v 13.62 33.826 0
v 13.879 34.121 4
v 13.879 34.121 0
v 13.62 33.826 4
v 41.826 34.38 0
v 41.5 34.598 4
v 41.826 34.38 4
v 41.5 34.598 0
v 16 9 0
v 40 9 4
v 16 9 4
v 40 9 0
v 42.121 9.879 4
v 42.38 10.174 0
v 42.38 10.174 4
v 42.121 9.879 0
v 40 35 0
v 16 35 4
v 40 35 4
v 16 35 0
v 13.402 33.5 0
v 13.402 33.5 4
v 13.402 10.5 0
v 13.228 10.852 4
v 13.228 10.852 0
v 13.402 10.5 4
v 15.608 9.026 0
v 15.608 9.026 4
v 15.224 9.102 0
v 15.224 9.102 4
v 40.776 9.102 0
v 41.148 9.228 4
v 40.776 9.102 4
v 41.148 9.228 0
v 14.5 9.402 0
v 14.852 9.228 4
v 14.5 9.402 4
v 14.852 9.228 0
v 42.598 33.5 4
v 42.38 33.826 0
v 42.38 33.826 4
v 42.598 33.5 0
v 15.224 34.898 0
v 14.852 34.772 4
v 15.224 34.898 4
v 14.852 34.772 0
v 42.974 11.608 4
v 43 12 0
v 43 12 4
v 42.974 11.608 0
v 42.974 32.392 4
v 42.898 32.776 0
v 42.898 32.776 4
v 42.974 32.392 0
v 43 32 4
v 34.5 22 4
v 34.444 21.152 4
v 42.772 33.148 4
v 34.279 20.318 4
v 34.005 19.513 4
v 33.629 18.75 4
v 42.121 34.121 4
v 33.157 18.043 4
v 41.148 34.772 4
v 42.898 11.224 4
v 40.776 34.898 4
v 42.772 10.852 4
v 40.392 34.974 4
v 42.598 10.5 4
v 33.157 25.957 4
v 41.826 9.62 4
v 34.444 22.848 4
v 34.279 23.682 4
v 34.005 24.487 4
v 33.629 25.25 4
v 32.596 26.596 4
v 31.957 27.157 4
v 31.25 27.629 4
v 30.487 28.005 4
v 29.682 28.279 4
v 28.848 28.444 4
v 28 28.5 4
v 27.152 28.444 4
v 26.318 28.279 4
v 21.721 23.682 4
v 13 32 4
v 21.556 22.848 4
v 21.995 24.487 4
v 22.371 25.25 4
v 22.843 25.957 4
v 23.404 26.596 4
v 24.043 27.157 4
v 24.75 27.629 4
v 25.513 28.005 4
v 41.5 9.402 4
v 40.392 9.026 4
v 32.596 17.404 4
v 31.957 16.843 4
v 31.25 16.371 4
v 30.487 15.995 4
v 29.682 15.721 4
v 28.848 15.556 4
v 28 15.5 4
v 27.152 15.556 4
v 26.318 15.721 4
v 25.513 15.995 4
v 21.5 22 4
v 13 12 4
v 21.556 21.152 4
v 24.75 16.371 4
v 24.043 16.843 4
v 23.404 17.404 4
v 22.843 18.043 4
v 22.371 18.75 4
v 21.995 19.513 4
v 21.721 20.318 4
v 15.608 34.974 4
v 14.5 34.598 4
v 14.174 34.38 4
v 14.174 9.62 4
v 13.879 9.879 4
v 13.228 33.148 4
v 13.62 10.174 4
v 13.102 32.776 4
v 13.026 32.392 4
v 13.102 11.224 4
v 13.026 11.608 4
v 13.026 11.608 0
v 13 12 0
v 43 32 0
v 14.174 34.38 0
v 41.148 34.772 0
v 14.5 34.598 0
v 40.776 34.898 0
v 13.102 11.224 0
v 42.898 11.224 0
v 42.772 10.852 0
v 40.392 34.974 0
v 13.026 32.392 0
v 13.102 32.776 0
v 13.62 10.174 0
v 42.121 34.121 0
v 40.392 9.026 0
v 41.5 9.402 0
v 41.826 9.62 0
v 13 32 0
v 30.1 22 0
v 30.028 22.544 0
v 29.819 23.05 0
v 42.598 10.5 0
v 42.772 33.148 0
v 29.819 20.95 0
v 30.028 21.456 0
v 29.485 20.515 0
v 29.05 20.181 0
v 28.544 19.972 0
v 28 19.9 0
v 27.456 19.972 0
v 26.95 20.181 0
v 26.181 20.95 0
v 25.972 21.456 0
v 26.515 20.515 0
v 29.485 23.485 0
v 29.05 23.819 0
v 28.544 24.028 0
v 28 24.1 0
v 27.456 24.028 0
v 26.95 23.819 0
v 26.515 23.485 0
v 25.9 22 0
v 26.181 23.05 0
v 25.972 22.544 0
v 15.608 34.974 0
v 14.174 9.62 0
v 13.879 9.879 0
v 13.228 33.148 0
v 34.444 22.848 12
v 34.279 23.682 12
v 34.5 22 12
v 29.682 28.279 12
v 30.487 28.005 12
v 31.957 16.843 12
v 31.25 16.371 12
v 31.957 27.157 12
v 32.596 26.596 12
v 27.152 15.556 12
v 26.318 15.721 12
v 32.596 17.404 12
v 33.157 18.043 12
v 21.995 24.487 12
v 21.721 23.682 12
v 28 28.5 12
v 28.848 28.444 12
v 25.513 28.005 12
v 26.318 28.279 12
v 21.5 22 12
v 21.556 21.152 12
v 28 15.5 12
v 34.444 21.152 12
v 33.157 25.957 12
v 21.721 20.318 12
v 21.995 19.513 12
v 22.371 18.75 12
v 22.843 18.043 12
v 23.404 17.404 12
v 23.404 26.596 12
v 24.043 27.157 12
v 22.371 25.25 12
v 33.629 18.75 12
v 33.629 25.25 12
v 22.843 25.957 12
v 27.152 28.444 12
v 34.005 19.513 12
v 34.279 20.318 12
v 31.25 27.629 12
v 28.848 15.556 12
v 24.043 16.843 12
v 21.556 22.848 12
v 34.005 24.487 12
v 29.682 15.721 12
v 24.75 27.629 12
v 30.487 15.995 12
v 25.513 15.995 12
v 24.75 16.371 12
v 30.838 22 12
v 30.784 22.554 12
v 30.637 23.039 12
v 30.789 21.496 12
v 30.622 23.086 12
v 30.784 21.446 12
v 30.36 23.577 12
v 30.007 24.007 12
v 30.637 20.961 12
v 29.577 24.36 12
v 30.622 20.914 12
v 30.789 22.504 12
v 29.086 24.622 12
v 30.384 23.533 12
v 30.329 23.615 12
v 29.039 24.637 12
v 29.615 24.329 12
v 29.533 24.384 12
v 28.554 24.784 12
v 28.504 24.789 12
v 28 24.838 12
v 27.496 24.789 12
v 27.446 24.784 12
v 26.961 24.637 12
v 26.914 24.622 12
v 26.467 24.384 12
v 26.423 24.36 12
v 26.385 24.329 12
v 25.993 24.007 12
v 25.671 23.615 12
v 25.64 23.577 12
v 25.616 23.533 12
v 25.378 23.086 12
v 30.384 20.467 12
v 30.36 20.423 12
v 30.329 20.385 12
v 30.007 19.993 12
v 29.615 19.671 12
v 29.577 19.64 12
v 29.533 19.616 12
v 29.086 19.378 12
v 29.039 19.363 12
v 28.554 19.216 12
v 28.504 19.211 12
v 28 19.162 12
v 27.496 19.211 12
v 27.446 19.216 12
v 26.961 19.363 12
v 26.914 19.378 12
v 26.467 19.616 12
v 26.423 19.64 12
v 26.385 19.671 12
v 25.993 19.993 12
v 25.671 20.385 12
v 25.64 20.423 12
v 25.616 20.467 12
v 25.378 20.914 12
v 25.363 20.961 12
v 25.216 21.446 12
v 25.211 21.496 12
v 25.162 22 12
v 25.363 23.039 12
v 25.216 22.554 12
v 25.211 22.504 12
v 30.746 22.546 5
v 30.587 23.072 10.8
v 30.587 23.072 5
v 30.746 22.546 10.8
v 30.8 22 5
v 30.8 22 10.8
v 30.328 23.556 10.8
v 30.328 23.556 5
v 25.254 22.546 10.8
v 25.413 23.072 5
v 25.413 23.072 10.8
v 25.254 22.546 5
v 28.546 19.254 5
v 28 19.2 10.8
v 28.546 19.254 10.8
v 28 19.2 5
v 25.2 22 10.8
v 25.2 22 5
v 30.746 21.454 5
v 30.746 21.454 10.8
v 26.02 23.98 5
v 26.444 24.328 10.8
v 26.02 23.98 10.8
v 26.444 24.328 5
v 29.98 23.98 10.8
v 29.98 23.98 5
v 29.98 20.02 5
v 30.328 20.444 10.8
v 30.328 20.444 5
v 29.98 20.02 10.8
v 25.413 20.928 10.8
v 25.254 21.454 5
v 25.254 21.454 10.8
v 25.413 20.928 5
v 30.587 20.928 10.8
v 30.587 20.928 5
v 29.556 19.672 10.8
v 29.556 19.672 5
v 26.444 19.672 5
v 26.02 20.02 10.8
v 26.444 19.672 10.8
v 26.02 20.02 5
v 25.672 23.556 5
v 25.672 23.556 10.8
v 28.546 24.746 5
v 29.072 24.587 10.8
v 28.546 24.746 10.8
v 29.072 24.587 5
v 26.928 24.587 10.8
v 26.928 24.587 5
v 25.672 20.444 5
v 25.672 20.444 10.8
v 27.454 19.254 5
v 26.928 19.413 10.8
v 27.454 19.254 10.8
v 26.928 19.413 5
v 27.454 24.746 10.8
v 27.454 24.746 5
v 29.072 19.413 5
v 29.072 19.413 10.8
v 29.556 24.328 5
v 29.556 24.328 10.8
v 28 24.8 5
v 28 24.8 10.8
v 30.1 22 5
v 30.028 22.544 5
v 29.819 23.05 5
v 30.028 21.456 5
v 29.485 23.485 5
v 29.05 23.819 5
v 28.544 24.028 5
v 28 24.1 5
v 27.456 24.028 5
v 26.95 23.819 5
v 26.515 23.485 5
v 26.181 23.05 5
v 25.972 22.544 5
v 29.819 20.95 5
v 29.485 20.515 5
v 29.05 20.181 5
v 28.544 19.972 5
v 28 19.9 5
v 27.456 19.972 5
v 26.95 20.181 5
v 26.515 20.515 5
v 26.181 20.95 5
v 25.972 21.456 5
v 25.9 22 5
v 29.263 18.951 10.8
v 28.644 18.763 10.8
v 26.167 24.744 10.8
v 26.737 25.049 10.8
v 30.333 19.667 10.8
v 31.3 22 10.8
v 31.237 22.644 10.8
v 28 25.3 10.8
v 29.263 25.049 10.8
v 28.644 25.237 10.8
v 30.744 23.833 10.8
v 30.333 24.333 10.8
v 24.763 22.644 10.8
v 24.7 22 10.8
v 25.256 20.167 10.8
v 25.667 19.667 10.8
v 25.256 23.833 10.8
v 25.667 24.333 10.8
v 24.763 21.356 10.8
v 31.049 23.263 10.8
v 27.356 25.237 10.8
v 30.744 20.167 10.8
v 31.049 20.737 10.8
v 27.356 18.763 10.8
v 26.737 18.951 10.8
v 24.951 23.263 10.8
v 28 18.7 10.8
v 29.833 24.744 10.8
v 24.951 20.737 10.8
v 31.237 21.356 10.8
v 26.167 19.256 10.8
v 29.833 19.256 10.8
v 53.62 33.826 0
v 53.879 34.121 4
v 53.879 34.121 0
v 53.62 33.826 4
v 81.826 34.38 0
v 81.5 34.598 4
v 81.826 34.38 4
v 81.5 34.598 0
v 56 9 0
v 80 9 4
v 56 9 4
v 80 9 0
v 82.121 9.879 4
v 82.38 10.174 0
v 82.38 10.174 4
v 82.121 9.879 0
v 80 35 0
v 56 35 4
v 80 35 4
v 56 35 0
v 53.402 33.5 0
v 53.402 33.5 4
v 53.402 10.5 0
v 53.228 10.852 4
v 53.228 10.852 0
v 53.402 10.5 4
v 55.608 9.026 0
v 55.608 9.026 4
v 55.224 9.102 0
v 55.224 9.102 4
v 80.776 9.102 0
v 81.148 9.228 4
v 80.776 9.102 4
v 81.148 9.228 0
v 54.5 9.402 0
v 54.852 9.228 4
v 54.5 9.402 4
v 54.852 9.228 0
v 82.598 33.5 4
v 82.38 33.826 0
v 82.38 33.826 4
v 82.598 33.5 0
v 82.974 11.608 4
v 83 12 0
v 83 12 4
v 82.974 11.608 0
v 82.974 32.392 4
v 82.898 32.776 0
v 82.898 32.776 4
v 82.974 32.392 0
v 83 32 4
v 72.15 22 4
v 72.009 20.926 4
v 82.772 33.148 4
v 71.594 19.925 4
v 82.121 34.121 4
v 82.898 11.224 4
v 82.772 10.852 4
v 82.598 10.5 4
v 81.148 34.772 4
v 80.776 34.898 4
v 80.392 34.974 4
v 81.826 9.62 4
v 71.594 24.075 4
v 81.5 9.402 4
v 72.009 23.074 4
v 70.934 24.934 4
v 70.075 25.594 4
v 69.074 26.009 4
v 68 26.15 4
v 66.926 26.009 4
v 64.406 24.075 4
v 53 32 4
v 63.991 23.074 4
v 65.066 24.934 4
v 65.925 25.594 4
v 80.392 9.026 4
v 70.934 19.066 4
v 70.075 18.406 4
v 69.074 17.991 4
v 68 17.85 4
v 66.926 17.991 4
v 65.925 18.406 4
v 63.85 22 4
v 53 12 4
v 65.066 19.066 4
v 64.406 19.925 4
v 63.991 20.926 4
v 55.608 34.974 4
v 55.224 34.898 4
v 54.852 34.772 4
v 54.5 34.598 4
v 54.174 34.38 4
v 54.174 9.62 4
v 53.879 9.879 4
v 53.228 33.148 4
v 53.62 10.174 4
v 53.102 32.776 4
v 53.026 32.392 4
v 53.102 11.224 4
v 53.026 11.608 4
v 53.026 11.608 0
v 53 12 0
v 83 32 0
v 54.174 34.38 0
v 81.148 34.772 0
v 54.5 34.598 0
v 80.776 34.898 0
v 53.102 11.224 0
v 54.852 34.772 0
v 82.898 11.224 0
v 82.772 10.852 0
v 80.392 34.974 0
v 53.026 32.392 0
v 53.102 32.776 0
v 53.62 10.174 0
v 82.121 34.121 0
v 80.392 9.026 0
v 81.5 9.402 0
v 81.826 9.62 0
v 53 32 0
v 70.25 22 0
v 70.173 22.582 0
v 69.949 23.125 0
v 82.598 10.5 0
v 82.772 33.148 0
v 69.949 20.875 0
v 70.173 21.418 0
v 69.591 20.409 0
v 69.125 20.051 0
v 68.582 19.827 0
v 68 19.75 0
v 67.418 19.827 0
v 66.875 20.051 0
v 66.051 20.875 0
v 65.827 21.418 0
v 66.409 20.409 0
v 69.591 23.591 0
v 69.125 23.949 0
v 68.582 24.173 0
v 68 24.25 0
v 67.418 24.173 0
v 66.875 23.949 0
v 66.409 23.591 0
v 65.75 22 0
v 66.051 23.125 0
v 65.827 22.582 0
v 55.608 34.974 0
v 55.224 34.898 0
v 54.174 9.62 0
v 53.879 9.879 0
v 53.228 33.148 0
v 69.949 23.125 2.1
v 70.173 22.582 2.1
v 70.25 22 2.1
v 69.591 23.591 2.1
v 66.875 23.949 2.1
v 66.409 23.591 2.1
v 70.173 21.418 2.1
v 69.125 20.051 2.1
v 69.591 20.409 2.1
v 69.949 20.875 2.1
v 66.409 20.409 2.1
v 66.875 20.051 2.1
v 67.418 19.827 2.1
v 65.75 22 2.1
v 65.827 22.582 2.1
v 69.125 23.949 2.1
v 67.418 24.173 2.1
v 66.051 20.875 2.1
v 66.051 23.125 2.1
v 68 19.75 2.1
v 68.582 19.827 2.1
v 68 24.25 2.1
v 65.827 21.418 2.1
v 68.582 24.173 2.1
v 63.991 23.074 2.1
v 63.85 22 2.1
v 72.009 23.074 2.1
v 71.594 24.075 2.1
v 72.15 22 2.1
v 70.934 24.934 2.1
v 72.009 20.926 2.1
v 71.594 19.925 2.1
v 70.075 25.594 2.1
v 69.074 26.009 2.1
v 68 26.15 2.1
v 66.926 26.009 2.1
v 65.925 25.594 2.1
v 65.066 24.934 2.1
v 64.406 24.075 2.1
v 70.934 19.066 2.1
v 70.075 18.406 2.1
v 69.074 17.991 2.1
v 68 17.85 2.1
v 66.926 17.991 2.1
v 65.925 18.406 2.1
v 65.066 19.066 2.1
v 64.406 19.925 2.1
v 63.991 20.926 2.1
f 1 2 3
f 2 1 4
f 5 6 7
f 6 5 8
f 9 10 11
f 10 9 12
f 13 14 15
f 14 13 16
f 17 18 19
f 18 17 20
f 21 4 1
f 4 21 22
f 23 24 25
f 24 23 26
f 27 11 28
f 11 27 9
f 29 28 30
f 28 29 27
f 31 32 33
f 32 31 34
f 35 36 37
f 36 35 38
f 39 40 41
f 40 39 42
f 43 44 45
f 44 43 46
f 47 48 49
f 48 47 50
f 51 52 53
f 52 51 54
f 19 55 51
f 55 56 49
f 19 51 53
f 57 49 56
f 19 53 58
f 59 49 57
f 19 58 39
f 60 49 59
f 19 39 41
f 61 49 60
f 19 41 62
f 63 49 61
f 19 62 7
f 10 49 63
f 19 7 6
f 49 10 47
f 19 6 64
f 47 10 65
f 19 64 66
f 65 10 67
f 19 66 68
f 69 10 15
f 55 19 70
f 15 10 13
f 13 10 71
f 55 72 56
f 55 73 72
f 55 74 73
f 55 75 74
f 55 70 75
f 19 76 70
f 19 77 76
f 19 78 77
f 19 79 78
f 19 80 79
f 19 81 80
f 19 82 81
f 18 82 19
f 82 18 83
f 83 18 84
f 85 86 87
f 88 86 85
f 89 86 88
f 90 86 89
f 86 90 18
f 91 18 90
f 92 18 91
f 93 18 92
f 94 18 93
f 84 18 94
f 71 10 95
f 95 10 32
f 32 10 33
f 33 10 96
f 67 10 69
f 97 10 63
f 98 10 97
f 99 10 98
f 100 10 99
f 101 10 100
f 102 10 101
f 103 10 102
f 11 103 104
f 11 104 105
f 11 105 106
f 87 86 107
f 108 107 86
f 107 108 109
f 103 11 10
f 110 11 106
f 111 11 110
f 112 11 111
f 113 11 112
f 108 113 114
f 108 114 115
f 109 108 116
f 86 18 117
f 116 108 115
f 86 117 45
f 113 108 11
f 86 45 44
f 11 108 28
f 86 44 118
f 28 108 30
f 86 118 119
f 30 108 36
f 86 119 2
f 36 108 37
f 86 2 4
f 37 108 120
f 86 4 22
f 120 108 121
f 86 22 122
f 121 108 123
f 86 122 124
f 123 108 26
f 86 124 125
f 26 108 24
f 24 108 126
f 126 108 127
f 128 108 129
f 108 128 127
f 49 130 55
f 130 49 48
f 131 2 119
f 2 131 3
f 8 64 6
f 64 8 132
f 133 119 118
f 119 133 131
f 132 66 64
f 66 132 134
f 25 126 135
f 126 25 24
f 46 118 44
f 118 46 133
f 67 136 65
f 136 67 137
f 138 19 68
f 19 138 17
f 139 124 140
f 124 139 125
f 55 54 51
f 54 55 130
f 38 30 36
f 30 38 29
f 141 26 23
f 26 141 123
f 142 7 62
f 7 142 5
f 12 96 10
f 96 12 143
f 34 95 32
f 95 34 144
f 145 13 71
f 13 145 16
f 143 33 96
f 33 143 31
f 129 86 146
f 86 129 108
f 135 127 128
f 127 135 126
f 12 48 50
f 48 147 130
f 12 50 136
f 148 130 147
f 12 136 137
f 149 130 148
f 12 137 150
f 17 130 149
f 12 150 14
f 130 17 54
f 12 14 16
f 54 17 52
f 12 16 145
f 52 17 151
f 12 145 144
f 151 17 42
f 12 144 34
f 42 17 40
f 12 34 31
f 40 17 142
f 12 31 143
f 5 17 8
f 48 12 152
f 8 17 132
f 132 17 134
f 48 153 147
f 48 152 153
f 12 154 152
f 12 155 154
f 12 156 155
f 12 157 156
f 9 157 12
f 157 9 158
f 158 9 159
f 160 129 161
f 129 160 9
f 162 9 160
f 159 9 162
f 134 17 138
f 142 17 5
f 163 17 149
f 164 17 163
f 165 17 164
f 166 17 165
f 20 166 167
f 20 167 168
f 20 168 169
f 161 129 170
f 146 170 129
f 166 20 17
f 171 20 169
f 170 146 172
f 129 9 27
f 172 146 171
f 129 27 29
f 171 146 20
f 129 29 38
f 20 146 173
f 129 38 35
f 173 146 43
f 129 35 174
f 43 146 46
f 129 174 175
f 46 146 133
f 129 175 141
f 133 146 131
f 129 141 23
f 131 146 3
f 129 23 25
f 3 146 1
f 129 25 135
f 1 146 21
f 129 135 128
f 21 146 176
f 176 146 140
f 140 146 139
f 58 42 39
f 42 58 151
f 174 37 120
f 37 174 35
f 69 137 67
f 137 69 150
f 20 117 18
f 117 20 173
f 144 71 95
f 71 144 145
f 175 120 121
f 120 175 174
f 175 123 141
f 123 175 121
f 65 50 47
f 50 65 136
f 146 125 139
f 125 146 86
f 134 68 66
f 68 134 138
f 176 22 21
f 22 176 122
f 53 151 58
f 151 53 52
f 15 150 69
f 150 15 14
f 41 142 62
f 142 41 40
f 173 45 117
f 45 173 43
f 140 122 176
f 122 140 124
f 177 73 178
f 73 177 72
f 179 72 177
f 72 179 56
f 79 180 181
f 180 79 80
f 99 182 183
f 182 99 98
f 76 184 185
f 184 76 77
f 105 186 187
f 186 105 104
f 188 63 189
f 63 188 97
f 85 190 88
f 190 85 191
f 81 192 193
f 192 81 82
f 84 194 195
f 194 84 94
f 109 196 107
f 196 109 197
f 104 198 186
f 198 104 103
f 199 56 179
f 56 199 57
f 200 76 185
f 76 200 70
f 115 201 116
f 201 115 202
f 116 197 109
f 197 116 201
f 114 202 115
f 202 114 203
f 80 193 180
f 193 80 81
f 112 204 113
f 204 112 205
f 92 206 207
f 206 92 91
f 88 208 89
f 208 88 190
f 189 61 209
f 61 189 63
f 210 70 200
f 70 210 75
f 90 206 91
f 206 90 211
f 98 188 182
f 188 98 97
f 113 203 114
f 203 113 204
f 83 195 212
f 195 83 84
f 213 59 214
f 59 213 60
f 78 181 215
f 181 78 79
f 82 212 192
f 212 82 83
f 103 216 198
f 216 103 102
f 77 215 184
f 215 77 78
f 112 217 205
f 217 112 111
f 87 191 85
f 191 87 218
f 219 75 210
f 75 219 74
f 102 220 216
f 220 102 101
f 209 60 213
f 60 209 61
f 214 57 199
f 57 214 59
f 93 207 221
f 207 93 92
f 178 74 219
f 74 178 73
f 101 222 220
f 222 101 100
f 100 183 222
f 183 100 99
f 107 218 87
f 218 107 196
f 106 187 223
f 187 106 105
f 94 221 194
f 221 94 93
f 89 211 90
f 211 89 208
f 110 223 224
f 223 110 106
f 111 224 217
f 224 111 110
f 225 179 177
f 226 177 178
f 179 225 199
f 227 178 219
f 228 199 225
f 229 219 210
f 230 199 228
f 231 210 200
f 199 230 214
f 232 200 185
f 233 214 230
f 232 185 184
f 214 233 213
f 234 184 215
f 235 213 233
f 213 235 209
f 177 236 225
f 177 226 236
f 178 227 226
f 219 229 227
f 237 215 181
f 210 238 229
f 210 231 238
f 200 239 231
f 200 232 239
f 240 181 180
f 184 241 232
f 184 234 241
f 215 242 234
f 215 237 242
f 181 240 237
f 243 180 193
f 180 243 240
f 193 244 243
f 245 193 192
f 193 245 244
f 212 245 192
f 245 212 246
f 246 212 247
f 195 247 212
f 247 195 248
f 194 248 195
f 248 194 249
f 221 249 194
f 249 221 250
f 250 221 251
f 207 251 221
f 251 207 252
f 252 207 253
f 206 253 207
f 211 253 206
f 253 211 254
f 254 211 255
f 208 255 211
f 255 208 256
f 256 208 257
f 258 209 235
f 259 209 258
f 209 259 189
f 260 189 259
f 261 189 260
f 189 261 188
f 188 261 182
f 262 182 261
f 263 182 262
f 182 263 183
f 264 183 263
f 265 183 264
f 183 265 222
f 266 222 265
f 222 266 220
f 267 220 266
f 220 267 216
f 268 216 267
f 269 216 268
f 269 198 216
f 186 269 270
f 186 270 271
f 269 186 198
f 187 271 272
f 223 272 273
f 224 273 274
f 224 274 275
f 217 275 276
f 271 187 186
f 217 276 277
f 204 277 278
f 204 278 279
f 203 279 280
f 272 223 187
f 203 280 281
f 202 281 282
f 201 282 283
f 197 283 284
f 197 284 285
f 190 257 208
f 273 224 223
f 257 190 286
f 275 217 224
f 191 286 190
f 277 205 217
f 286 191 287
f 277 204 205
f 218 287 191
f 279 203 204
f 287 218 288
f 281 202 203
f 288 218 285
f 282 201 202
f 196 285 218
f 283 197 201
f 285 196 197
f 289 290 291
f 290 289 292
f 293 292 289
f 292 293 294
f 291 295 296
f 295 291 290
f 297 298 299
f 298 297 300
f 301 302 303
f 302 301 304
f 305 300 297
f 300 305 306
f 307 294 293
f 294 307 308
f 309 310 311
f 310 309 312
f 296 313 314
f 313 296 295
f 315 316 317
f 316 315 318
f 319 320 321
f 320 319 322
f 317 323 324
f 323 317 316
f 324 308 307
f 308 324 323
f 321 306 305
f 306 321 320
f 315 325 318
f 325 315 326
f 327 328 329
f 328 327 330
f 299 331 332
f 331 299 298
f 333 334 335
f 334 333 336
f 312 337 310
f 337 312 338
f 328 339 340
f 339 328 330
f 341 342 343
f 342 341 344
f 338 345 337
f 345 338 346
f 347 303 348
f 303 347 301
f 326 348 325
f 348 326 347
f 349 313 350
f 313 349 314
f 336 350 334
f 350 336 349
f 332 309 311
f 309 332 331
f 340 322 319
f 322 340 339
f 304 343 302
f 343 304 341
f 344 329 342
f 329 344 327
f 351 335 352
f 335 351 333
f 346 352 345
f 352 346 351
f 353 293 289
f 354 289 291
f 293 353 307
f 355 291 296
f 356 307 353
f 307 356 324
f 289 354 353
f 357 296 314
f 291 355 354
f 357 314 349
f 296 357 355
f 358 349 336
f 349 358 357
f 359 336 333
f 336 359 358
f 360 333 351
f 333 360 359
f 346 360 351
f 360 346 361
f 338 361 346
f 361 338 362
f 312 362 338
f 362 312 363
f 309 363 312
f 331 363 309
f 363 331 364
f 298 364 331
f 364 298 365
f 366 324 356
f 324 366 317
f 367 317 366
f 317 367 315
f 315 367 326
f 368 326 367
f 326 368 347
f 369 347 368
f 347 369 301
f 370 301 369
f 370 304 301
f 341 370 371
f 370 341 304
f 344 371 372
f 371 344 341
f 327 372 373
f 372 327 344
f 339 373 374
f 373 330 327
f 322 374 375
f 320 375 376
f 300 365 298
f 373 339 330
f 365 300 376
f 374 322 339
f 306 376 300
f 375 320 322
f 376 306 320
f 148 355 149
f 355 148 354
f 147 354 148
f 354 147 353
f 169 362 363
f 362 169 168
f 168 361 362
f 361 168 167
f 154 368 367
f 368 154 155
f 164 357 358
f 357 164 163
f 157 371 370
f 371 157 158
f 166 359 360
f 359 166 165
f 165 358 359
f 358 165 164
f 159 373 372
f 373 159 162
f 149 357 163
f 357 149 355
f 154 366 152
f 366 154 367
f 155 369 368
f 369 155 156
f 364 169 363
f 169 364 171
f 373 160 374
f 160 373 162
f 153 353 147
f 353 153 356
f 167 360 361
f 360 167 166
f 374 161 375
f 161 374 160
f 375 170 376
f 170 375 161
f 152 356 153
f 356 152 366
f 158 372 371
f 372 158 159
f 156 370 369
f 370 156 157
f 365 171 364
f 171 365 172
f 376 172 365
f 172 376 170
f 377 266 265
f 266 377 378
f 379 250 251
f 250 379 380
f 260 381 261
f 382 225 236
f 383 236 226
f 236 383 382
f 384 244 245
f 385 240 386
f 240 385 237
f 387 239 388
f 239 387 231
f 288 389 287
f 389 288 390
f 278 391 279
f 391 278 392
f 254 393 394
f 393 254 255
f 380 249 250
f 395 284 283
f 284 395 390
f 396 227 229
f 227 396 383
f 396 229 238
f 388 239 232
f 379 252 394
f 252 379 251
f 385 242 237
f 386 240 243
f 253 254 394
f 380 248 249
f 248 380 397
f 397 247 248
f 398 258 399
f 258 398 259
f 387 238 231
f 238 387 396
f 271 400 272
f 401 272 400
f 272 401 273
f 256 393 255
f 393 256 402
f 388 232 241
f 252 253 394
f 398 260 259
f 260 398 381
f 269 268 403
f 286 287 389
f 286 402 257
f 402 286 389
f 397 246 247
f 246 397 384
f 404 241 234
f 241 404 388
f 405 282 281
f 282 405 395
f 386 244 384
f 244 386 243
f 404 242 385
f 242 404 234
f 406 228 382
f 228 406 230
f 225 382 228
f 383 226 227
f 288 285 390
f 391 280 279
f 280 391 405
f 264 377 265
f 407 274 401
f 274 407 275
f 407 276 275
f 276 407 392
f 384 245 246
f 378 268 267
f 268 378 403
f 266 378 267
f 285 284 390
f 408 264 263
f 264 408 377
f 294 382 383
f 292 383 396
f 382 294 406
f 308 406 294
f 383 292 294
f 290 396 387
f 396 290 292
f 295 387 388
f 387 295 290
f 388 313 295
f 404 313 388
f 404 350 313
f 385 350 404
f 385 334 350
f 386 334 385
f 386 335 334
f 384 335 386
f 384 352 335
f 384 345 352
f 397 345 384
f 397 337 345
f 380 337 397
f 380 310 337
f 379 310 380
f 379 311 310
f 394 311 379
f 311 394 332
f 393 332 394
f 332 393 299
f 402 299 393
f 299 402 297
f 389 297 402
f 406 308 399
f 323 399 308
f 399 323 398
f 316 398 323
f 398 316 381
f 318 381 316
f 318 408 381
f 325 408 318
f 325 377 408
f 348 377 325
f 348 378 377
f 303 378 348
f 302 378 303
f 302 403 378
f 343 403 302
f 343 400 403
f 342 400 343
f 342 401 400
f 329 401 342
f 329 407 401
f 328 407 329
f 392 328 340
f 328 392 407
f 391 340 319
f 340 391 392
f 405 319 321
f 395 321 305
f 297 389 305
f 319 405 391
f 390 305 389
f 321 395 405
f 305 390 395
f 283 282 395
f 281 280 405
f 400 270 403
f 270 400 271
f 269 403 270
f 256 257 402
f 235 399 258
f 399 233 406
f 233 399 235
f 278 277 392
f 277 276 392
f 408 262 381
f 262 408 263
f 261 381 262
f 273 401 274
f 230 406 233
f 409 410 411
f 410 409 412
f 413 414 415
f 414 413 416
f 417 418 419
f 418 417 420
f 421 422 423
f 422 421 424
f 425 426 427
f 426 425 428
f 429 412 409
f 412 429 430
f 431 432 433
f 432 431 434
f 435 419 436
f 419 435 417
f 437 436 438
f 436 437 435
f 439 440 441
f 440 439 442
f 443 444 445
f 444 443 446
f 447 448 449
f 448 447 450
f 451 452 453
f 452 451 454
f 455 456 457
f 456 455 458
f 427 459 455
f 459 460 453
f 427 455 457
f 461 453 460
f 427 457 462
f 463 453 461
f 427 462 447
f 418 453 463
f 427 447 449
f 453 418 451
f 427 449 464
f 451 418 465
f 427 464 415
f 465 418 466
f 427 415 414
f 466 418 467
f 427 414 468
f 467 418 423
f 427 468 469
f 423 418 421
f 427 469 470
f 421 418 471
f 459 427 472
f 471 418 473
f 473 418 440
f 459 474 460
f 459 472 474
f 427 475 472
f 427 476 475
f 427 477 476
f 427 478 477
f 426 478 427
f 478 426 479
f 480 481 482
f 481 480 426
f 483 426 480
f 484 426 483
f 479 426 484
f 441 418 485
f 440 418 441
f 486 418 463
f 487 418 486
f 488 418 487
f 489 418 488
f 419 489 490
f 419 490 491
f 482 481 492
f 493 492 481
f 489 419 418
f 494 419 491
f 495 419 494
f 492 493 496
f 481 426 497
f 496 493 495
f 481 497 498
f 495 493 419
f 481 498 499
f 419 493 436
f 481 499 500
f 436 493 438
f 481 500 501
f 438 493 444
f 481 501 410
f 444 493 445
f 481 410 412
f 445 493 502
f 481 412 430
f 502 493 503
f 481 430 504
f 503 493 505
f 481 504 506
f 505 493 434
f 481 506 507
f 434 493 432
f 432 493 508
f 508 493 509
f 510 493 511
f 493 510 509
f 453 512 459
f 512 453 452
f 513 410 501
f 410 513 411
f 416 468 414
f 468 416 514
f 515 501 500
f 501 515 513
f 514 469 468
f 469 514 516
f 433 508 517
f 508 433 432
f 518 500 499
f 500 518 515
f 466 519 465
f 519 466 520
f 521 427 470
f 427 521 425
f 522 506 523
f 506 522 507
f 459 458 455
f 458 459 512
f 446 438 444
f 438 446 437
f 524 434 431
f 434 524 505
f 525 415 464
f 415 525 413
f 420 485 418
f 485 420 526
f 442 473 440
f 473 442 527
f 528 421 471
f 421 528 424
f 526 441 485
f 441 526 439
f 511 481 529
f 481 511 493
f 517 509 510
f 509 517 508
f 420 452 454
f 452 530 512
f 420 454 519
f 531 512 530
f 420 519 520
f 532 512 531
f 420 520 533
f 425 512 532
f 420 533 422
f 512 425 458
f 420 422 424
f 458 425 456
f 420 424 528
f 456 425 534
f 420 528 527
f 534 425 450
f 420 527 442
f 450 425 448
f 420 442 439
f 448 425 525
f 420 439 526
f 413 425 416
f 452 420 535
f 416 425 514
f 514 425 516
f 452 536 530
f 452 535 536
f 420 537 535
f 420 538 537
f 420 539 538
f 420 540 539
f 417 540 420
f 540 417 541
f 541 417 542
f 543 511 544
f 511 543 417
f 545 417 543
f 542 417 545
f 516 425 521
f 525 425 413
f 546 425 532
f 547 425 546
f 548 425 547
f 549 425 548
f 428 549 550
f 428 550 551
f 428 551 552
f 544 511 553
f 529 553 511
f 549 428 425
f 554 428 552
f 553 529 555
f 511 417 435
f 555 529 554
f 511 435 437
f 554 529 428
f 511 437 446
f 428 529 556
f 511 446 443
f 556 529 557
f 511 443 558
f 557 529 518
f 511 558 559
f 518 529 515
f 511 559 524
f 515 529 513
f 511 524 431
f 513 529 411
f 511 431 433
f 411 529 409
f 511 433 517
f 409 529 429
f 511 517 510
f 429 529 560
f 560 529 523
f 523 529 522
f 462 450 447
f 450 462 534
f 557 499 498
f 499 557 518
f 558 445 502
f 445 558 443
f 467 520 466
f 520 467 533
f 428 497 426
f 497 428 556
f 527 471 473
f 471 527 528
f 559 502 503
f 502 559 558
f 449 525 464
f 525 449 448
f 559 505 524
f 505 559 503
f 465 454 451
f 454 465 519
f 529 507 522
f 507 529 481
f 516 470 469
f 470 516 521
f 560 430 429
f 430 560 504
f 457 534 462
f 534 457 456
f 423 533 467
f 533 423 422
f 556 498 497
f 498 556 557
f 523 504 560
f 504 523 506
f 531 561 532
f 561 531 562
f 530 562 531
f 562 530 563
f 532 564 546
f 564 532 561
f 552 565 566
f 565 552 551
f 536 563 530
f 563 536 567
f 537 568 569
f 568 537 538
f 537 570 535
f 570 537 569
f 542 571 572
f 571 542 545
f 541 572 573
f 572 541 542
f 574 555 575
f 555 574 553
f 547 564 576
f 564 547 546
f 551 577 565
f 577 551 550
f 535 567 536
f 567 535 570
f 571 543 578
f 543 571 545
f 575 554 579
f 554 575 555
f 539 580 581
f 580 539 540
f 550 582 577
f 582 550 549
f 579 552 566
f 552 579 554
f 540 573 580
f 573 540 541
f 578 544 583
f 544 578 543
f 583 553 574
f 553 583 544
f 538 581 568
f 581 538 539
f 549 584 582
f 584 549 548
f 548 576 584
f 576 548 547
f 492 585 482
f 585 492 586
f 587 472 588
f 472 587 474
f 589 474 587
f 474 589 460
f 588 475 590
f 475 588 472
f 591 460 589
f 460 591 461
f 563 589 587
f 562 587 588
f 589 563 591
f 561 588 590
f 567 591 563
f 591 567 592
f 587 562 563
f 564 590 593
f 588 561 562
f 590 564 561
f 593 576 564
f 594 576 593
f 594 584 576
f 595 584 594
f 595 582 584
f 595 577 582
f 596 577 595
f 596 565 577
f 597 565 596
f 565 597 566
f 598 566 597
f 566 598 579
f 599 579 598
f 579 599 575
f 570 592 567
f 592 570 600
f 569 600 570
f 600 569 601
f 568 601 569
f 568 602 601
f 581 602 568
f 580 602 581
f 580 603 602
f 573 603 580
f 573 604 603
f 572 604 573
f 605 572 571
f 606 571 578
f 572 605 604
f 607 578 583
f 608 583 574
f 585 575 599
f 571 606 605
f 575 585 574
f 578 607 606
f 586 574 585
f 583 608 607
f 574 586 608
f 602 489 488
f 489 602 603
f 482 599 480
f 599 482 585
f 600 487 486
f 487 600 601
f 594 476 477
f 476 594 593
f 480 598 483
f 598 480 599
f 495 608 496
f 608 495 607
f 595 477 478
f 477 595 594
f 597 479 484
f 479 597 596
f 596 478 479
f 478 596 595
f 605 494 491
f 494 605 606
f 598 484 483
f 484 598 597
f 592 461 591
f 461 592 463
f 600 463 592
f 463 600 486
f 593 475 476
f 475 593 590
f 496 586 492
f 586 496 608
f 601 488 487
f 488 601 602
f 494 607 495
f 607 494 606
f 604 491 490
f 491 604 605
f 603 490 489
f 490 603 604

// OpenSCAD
/*
Sample 064: Heizeinsatz-Schraubprobe — M4
Generated from the FDM Mechanical Sample Library.
Units: millimetres.

Override examples:
  openscad -o custom.stl -D 'view="plate"' -D 'render_fn=64' model.scad
  openscad -o preview.png -D 'view="assembly"' model.scad
*/
use <../../../library/fdm_mechanisms.scad>

render_fn = is_undef(render_fn) ? 48 : render_fn;
view = is_undef(view) ? "plate" : view;
$fn = render_fn;

sample_heatset_insert(
    view=view,
    pilot_d=5.6,
    screw_clear=4.5,
    head_d=8.3,
    insert_depth=7
);
